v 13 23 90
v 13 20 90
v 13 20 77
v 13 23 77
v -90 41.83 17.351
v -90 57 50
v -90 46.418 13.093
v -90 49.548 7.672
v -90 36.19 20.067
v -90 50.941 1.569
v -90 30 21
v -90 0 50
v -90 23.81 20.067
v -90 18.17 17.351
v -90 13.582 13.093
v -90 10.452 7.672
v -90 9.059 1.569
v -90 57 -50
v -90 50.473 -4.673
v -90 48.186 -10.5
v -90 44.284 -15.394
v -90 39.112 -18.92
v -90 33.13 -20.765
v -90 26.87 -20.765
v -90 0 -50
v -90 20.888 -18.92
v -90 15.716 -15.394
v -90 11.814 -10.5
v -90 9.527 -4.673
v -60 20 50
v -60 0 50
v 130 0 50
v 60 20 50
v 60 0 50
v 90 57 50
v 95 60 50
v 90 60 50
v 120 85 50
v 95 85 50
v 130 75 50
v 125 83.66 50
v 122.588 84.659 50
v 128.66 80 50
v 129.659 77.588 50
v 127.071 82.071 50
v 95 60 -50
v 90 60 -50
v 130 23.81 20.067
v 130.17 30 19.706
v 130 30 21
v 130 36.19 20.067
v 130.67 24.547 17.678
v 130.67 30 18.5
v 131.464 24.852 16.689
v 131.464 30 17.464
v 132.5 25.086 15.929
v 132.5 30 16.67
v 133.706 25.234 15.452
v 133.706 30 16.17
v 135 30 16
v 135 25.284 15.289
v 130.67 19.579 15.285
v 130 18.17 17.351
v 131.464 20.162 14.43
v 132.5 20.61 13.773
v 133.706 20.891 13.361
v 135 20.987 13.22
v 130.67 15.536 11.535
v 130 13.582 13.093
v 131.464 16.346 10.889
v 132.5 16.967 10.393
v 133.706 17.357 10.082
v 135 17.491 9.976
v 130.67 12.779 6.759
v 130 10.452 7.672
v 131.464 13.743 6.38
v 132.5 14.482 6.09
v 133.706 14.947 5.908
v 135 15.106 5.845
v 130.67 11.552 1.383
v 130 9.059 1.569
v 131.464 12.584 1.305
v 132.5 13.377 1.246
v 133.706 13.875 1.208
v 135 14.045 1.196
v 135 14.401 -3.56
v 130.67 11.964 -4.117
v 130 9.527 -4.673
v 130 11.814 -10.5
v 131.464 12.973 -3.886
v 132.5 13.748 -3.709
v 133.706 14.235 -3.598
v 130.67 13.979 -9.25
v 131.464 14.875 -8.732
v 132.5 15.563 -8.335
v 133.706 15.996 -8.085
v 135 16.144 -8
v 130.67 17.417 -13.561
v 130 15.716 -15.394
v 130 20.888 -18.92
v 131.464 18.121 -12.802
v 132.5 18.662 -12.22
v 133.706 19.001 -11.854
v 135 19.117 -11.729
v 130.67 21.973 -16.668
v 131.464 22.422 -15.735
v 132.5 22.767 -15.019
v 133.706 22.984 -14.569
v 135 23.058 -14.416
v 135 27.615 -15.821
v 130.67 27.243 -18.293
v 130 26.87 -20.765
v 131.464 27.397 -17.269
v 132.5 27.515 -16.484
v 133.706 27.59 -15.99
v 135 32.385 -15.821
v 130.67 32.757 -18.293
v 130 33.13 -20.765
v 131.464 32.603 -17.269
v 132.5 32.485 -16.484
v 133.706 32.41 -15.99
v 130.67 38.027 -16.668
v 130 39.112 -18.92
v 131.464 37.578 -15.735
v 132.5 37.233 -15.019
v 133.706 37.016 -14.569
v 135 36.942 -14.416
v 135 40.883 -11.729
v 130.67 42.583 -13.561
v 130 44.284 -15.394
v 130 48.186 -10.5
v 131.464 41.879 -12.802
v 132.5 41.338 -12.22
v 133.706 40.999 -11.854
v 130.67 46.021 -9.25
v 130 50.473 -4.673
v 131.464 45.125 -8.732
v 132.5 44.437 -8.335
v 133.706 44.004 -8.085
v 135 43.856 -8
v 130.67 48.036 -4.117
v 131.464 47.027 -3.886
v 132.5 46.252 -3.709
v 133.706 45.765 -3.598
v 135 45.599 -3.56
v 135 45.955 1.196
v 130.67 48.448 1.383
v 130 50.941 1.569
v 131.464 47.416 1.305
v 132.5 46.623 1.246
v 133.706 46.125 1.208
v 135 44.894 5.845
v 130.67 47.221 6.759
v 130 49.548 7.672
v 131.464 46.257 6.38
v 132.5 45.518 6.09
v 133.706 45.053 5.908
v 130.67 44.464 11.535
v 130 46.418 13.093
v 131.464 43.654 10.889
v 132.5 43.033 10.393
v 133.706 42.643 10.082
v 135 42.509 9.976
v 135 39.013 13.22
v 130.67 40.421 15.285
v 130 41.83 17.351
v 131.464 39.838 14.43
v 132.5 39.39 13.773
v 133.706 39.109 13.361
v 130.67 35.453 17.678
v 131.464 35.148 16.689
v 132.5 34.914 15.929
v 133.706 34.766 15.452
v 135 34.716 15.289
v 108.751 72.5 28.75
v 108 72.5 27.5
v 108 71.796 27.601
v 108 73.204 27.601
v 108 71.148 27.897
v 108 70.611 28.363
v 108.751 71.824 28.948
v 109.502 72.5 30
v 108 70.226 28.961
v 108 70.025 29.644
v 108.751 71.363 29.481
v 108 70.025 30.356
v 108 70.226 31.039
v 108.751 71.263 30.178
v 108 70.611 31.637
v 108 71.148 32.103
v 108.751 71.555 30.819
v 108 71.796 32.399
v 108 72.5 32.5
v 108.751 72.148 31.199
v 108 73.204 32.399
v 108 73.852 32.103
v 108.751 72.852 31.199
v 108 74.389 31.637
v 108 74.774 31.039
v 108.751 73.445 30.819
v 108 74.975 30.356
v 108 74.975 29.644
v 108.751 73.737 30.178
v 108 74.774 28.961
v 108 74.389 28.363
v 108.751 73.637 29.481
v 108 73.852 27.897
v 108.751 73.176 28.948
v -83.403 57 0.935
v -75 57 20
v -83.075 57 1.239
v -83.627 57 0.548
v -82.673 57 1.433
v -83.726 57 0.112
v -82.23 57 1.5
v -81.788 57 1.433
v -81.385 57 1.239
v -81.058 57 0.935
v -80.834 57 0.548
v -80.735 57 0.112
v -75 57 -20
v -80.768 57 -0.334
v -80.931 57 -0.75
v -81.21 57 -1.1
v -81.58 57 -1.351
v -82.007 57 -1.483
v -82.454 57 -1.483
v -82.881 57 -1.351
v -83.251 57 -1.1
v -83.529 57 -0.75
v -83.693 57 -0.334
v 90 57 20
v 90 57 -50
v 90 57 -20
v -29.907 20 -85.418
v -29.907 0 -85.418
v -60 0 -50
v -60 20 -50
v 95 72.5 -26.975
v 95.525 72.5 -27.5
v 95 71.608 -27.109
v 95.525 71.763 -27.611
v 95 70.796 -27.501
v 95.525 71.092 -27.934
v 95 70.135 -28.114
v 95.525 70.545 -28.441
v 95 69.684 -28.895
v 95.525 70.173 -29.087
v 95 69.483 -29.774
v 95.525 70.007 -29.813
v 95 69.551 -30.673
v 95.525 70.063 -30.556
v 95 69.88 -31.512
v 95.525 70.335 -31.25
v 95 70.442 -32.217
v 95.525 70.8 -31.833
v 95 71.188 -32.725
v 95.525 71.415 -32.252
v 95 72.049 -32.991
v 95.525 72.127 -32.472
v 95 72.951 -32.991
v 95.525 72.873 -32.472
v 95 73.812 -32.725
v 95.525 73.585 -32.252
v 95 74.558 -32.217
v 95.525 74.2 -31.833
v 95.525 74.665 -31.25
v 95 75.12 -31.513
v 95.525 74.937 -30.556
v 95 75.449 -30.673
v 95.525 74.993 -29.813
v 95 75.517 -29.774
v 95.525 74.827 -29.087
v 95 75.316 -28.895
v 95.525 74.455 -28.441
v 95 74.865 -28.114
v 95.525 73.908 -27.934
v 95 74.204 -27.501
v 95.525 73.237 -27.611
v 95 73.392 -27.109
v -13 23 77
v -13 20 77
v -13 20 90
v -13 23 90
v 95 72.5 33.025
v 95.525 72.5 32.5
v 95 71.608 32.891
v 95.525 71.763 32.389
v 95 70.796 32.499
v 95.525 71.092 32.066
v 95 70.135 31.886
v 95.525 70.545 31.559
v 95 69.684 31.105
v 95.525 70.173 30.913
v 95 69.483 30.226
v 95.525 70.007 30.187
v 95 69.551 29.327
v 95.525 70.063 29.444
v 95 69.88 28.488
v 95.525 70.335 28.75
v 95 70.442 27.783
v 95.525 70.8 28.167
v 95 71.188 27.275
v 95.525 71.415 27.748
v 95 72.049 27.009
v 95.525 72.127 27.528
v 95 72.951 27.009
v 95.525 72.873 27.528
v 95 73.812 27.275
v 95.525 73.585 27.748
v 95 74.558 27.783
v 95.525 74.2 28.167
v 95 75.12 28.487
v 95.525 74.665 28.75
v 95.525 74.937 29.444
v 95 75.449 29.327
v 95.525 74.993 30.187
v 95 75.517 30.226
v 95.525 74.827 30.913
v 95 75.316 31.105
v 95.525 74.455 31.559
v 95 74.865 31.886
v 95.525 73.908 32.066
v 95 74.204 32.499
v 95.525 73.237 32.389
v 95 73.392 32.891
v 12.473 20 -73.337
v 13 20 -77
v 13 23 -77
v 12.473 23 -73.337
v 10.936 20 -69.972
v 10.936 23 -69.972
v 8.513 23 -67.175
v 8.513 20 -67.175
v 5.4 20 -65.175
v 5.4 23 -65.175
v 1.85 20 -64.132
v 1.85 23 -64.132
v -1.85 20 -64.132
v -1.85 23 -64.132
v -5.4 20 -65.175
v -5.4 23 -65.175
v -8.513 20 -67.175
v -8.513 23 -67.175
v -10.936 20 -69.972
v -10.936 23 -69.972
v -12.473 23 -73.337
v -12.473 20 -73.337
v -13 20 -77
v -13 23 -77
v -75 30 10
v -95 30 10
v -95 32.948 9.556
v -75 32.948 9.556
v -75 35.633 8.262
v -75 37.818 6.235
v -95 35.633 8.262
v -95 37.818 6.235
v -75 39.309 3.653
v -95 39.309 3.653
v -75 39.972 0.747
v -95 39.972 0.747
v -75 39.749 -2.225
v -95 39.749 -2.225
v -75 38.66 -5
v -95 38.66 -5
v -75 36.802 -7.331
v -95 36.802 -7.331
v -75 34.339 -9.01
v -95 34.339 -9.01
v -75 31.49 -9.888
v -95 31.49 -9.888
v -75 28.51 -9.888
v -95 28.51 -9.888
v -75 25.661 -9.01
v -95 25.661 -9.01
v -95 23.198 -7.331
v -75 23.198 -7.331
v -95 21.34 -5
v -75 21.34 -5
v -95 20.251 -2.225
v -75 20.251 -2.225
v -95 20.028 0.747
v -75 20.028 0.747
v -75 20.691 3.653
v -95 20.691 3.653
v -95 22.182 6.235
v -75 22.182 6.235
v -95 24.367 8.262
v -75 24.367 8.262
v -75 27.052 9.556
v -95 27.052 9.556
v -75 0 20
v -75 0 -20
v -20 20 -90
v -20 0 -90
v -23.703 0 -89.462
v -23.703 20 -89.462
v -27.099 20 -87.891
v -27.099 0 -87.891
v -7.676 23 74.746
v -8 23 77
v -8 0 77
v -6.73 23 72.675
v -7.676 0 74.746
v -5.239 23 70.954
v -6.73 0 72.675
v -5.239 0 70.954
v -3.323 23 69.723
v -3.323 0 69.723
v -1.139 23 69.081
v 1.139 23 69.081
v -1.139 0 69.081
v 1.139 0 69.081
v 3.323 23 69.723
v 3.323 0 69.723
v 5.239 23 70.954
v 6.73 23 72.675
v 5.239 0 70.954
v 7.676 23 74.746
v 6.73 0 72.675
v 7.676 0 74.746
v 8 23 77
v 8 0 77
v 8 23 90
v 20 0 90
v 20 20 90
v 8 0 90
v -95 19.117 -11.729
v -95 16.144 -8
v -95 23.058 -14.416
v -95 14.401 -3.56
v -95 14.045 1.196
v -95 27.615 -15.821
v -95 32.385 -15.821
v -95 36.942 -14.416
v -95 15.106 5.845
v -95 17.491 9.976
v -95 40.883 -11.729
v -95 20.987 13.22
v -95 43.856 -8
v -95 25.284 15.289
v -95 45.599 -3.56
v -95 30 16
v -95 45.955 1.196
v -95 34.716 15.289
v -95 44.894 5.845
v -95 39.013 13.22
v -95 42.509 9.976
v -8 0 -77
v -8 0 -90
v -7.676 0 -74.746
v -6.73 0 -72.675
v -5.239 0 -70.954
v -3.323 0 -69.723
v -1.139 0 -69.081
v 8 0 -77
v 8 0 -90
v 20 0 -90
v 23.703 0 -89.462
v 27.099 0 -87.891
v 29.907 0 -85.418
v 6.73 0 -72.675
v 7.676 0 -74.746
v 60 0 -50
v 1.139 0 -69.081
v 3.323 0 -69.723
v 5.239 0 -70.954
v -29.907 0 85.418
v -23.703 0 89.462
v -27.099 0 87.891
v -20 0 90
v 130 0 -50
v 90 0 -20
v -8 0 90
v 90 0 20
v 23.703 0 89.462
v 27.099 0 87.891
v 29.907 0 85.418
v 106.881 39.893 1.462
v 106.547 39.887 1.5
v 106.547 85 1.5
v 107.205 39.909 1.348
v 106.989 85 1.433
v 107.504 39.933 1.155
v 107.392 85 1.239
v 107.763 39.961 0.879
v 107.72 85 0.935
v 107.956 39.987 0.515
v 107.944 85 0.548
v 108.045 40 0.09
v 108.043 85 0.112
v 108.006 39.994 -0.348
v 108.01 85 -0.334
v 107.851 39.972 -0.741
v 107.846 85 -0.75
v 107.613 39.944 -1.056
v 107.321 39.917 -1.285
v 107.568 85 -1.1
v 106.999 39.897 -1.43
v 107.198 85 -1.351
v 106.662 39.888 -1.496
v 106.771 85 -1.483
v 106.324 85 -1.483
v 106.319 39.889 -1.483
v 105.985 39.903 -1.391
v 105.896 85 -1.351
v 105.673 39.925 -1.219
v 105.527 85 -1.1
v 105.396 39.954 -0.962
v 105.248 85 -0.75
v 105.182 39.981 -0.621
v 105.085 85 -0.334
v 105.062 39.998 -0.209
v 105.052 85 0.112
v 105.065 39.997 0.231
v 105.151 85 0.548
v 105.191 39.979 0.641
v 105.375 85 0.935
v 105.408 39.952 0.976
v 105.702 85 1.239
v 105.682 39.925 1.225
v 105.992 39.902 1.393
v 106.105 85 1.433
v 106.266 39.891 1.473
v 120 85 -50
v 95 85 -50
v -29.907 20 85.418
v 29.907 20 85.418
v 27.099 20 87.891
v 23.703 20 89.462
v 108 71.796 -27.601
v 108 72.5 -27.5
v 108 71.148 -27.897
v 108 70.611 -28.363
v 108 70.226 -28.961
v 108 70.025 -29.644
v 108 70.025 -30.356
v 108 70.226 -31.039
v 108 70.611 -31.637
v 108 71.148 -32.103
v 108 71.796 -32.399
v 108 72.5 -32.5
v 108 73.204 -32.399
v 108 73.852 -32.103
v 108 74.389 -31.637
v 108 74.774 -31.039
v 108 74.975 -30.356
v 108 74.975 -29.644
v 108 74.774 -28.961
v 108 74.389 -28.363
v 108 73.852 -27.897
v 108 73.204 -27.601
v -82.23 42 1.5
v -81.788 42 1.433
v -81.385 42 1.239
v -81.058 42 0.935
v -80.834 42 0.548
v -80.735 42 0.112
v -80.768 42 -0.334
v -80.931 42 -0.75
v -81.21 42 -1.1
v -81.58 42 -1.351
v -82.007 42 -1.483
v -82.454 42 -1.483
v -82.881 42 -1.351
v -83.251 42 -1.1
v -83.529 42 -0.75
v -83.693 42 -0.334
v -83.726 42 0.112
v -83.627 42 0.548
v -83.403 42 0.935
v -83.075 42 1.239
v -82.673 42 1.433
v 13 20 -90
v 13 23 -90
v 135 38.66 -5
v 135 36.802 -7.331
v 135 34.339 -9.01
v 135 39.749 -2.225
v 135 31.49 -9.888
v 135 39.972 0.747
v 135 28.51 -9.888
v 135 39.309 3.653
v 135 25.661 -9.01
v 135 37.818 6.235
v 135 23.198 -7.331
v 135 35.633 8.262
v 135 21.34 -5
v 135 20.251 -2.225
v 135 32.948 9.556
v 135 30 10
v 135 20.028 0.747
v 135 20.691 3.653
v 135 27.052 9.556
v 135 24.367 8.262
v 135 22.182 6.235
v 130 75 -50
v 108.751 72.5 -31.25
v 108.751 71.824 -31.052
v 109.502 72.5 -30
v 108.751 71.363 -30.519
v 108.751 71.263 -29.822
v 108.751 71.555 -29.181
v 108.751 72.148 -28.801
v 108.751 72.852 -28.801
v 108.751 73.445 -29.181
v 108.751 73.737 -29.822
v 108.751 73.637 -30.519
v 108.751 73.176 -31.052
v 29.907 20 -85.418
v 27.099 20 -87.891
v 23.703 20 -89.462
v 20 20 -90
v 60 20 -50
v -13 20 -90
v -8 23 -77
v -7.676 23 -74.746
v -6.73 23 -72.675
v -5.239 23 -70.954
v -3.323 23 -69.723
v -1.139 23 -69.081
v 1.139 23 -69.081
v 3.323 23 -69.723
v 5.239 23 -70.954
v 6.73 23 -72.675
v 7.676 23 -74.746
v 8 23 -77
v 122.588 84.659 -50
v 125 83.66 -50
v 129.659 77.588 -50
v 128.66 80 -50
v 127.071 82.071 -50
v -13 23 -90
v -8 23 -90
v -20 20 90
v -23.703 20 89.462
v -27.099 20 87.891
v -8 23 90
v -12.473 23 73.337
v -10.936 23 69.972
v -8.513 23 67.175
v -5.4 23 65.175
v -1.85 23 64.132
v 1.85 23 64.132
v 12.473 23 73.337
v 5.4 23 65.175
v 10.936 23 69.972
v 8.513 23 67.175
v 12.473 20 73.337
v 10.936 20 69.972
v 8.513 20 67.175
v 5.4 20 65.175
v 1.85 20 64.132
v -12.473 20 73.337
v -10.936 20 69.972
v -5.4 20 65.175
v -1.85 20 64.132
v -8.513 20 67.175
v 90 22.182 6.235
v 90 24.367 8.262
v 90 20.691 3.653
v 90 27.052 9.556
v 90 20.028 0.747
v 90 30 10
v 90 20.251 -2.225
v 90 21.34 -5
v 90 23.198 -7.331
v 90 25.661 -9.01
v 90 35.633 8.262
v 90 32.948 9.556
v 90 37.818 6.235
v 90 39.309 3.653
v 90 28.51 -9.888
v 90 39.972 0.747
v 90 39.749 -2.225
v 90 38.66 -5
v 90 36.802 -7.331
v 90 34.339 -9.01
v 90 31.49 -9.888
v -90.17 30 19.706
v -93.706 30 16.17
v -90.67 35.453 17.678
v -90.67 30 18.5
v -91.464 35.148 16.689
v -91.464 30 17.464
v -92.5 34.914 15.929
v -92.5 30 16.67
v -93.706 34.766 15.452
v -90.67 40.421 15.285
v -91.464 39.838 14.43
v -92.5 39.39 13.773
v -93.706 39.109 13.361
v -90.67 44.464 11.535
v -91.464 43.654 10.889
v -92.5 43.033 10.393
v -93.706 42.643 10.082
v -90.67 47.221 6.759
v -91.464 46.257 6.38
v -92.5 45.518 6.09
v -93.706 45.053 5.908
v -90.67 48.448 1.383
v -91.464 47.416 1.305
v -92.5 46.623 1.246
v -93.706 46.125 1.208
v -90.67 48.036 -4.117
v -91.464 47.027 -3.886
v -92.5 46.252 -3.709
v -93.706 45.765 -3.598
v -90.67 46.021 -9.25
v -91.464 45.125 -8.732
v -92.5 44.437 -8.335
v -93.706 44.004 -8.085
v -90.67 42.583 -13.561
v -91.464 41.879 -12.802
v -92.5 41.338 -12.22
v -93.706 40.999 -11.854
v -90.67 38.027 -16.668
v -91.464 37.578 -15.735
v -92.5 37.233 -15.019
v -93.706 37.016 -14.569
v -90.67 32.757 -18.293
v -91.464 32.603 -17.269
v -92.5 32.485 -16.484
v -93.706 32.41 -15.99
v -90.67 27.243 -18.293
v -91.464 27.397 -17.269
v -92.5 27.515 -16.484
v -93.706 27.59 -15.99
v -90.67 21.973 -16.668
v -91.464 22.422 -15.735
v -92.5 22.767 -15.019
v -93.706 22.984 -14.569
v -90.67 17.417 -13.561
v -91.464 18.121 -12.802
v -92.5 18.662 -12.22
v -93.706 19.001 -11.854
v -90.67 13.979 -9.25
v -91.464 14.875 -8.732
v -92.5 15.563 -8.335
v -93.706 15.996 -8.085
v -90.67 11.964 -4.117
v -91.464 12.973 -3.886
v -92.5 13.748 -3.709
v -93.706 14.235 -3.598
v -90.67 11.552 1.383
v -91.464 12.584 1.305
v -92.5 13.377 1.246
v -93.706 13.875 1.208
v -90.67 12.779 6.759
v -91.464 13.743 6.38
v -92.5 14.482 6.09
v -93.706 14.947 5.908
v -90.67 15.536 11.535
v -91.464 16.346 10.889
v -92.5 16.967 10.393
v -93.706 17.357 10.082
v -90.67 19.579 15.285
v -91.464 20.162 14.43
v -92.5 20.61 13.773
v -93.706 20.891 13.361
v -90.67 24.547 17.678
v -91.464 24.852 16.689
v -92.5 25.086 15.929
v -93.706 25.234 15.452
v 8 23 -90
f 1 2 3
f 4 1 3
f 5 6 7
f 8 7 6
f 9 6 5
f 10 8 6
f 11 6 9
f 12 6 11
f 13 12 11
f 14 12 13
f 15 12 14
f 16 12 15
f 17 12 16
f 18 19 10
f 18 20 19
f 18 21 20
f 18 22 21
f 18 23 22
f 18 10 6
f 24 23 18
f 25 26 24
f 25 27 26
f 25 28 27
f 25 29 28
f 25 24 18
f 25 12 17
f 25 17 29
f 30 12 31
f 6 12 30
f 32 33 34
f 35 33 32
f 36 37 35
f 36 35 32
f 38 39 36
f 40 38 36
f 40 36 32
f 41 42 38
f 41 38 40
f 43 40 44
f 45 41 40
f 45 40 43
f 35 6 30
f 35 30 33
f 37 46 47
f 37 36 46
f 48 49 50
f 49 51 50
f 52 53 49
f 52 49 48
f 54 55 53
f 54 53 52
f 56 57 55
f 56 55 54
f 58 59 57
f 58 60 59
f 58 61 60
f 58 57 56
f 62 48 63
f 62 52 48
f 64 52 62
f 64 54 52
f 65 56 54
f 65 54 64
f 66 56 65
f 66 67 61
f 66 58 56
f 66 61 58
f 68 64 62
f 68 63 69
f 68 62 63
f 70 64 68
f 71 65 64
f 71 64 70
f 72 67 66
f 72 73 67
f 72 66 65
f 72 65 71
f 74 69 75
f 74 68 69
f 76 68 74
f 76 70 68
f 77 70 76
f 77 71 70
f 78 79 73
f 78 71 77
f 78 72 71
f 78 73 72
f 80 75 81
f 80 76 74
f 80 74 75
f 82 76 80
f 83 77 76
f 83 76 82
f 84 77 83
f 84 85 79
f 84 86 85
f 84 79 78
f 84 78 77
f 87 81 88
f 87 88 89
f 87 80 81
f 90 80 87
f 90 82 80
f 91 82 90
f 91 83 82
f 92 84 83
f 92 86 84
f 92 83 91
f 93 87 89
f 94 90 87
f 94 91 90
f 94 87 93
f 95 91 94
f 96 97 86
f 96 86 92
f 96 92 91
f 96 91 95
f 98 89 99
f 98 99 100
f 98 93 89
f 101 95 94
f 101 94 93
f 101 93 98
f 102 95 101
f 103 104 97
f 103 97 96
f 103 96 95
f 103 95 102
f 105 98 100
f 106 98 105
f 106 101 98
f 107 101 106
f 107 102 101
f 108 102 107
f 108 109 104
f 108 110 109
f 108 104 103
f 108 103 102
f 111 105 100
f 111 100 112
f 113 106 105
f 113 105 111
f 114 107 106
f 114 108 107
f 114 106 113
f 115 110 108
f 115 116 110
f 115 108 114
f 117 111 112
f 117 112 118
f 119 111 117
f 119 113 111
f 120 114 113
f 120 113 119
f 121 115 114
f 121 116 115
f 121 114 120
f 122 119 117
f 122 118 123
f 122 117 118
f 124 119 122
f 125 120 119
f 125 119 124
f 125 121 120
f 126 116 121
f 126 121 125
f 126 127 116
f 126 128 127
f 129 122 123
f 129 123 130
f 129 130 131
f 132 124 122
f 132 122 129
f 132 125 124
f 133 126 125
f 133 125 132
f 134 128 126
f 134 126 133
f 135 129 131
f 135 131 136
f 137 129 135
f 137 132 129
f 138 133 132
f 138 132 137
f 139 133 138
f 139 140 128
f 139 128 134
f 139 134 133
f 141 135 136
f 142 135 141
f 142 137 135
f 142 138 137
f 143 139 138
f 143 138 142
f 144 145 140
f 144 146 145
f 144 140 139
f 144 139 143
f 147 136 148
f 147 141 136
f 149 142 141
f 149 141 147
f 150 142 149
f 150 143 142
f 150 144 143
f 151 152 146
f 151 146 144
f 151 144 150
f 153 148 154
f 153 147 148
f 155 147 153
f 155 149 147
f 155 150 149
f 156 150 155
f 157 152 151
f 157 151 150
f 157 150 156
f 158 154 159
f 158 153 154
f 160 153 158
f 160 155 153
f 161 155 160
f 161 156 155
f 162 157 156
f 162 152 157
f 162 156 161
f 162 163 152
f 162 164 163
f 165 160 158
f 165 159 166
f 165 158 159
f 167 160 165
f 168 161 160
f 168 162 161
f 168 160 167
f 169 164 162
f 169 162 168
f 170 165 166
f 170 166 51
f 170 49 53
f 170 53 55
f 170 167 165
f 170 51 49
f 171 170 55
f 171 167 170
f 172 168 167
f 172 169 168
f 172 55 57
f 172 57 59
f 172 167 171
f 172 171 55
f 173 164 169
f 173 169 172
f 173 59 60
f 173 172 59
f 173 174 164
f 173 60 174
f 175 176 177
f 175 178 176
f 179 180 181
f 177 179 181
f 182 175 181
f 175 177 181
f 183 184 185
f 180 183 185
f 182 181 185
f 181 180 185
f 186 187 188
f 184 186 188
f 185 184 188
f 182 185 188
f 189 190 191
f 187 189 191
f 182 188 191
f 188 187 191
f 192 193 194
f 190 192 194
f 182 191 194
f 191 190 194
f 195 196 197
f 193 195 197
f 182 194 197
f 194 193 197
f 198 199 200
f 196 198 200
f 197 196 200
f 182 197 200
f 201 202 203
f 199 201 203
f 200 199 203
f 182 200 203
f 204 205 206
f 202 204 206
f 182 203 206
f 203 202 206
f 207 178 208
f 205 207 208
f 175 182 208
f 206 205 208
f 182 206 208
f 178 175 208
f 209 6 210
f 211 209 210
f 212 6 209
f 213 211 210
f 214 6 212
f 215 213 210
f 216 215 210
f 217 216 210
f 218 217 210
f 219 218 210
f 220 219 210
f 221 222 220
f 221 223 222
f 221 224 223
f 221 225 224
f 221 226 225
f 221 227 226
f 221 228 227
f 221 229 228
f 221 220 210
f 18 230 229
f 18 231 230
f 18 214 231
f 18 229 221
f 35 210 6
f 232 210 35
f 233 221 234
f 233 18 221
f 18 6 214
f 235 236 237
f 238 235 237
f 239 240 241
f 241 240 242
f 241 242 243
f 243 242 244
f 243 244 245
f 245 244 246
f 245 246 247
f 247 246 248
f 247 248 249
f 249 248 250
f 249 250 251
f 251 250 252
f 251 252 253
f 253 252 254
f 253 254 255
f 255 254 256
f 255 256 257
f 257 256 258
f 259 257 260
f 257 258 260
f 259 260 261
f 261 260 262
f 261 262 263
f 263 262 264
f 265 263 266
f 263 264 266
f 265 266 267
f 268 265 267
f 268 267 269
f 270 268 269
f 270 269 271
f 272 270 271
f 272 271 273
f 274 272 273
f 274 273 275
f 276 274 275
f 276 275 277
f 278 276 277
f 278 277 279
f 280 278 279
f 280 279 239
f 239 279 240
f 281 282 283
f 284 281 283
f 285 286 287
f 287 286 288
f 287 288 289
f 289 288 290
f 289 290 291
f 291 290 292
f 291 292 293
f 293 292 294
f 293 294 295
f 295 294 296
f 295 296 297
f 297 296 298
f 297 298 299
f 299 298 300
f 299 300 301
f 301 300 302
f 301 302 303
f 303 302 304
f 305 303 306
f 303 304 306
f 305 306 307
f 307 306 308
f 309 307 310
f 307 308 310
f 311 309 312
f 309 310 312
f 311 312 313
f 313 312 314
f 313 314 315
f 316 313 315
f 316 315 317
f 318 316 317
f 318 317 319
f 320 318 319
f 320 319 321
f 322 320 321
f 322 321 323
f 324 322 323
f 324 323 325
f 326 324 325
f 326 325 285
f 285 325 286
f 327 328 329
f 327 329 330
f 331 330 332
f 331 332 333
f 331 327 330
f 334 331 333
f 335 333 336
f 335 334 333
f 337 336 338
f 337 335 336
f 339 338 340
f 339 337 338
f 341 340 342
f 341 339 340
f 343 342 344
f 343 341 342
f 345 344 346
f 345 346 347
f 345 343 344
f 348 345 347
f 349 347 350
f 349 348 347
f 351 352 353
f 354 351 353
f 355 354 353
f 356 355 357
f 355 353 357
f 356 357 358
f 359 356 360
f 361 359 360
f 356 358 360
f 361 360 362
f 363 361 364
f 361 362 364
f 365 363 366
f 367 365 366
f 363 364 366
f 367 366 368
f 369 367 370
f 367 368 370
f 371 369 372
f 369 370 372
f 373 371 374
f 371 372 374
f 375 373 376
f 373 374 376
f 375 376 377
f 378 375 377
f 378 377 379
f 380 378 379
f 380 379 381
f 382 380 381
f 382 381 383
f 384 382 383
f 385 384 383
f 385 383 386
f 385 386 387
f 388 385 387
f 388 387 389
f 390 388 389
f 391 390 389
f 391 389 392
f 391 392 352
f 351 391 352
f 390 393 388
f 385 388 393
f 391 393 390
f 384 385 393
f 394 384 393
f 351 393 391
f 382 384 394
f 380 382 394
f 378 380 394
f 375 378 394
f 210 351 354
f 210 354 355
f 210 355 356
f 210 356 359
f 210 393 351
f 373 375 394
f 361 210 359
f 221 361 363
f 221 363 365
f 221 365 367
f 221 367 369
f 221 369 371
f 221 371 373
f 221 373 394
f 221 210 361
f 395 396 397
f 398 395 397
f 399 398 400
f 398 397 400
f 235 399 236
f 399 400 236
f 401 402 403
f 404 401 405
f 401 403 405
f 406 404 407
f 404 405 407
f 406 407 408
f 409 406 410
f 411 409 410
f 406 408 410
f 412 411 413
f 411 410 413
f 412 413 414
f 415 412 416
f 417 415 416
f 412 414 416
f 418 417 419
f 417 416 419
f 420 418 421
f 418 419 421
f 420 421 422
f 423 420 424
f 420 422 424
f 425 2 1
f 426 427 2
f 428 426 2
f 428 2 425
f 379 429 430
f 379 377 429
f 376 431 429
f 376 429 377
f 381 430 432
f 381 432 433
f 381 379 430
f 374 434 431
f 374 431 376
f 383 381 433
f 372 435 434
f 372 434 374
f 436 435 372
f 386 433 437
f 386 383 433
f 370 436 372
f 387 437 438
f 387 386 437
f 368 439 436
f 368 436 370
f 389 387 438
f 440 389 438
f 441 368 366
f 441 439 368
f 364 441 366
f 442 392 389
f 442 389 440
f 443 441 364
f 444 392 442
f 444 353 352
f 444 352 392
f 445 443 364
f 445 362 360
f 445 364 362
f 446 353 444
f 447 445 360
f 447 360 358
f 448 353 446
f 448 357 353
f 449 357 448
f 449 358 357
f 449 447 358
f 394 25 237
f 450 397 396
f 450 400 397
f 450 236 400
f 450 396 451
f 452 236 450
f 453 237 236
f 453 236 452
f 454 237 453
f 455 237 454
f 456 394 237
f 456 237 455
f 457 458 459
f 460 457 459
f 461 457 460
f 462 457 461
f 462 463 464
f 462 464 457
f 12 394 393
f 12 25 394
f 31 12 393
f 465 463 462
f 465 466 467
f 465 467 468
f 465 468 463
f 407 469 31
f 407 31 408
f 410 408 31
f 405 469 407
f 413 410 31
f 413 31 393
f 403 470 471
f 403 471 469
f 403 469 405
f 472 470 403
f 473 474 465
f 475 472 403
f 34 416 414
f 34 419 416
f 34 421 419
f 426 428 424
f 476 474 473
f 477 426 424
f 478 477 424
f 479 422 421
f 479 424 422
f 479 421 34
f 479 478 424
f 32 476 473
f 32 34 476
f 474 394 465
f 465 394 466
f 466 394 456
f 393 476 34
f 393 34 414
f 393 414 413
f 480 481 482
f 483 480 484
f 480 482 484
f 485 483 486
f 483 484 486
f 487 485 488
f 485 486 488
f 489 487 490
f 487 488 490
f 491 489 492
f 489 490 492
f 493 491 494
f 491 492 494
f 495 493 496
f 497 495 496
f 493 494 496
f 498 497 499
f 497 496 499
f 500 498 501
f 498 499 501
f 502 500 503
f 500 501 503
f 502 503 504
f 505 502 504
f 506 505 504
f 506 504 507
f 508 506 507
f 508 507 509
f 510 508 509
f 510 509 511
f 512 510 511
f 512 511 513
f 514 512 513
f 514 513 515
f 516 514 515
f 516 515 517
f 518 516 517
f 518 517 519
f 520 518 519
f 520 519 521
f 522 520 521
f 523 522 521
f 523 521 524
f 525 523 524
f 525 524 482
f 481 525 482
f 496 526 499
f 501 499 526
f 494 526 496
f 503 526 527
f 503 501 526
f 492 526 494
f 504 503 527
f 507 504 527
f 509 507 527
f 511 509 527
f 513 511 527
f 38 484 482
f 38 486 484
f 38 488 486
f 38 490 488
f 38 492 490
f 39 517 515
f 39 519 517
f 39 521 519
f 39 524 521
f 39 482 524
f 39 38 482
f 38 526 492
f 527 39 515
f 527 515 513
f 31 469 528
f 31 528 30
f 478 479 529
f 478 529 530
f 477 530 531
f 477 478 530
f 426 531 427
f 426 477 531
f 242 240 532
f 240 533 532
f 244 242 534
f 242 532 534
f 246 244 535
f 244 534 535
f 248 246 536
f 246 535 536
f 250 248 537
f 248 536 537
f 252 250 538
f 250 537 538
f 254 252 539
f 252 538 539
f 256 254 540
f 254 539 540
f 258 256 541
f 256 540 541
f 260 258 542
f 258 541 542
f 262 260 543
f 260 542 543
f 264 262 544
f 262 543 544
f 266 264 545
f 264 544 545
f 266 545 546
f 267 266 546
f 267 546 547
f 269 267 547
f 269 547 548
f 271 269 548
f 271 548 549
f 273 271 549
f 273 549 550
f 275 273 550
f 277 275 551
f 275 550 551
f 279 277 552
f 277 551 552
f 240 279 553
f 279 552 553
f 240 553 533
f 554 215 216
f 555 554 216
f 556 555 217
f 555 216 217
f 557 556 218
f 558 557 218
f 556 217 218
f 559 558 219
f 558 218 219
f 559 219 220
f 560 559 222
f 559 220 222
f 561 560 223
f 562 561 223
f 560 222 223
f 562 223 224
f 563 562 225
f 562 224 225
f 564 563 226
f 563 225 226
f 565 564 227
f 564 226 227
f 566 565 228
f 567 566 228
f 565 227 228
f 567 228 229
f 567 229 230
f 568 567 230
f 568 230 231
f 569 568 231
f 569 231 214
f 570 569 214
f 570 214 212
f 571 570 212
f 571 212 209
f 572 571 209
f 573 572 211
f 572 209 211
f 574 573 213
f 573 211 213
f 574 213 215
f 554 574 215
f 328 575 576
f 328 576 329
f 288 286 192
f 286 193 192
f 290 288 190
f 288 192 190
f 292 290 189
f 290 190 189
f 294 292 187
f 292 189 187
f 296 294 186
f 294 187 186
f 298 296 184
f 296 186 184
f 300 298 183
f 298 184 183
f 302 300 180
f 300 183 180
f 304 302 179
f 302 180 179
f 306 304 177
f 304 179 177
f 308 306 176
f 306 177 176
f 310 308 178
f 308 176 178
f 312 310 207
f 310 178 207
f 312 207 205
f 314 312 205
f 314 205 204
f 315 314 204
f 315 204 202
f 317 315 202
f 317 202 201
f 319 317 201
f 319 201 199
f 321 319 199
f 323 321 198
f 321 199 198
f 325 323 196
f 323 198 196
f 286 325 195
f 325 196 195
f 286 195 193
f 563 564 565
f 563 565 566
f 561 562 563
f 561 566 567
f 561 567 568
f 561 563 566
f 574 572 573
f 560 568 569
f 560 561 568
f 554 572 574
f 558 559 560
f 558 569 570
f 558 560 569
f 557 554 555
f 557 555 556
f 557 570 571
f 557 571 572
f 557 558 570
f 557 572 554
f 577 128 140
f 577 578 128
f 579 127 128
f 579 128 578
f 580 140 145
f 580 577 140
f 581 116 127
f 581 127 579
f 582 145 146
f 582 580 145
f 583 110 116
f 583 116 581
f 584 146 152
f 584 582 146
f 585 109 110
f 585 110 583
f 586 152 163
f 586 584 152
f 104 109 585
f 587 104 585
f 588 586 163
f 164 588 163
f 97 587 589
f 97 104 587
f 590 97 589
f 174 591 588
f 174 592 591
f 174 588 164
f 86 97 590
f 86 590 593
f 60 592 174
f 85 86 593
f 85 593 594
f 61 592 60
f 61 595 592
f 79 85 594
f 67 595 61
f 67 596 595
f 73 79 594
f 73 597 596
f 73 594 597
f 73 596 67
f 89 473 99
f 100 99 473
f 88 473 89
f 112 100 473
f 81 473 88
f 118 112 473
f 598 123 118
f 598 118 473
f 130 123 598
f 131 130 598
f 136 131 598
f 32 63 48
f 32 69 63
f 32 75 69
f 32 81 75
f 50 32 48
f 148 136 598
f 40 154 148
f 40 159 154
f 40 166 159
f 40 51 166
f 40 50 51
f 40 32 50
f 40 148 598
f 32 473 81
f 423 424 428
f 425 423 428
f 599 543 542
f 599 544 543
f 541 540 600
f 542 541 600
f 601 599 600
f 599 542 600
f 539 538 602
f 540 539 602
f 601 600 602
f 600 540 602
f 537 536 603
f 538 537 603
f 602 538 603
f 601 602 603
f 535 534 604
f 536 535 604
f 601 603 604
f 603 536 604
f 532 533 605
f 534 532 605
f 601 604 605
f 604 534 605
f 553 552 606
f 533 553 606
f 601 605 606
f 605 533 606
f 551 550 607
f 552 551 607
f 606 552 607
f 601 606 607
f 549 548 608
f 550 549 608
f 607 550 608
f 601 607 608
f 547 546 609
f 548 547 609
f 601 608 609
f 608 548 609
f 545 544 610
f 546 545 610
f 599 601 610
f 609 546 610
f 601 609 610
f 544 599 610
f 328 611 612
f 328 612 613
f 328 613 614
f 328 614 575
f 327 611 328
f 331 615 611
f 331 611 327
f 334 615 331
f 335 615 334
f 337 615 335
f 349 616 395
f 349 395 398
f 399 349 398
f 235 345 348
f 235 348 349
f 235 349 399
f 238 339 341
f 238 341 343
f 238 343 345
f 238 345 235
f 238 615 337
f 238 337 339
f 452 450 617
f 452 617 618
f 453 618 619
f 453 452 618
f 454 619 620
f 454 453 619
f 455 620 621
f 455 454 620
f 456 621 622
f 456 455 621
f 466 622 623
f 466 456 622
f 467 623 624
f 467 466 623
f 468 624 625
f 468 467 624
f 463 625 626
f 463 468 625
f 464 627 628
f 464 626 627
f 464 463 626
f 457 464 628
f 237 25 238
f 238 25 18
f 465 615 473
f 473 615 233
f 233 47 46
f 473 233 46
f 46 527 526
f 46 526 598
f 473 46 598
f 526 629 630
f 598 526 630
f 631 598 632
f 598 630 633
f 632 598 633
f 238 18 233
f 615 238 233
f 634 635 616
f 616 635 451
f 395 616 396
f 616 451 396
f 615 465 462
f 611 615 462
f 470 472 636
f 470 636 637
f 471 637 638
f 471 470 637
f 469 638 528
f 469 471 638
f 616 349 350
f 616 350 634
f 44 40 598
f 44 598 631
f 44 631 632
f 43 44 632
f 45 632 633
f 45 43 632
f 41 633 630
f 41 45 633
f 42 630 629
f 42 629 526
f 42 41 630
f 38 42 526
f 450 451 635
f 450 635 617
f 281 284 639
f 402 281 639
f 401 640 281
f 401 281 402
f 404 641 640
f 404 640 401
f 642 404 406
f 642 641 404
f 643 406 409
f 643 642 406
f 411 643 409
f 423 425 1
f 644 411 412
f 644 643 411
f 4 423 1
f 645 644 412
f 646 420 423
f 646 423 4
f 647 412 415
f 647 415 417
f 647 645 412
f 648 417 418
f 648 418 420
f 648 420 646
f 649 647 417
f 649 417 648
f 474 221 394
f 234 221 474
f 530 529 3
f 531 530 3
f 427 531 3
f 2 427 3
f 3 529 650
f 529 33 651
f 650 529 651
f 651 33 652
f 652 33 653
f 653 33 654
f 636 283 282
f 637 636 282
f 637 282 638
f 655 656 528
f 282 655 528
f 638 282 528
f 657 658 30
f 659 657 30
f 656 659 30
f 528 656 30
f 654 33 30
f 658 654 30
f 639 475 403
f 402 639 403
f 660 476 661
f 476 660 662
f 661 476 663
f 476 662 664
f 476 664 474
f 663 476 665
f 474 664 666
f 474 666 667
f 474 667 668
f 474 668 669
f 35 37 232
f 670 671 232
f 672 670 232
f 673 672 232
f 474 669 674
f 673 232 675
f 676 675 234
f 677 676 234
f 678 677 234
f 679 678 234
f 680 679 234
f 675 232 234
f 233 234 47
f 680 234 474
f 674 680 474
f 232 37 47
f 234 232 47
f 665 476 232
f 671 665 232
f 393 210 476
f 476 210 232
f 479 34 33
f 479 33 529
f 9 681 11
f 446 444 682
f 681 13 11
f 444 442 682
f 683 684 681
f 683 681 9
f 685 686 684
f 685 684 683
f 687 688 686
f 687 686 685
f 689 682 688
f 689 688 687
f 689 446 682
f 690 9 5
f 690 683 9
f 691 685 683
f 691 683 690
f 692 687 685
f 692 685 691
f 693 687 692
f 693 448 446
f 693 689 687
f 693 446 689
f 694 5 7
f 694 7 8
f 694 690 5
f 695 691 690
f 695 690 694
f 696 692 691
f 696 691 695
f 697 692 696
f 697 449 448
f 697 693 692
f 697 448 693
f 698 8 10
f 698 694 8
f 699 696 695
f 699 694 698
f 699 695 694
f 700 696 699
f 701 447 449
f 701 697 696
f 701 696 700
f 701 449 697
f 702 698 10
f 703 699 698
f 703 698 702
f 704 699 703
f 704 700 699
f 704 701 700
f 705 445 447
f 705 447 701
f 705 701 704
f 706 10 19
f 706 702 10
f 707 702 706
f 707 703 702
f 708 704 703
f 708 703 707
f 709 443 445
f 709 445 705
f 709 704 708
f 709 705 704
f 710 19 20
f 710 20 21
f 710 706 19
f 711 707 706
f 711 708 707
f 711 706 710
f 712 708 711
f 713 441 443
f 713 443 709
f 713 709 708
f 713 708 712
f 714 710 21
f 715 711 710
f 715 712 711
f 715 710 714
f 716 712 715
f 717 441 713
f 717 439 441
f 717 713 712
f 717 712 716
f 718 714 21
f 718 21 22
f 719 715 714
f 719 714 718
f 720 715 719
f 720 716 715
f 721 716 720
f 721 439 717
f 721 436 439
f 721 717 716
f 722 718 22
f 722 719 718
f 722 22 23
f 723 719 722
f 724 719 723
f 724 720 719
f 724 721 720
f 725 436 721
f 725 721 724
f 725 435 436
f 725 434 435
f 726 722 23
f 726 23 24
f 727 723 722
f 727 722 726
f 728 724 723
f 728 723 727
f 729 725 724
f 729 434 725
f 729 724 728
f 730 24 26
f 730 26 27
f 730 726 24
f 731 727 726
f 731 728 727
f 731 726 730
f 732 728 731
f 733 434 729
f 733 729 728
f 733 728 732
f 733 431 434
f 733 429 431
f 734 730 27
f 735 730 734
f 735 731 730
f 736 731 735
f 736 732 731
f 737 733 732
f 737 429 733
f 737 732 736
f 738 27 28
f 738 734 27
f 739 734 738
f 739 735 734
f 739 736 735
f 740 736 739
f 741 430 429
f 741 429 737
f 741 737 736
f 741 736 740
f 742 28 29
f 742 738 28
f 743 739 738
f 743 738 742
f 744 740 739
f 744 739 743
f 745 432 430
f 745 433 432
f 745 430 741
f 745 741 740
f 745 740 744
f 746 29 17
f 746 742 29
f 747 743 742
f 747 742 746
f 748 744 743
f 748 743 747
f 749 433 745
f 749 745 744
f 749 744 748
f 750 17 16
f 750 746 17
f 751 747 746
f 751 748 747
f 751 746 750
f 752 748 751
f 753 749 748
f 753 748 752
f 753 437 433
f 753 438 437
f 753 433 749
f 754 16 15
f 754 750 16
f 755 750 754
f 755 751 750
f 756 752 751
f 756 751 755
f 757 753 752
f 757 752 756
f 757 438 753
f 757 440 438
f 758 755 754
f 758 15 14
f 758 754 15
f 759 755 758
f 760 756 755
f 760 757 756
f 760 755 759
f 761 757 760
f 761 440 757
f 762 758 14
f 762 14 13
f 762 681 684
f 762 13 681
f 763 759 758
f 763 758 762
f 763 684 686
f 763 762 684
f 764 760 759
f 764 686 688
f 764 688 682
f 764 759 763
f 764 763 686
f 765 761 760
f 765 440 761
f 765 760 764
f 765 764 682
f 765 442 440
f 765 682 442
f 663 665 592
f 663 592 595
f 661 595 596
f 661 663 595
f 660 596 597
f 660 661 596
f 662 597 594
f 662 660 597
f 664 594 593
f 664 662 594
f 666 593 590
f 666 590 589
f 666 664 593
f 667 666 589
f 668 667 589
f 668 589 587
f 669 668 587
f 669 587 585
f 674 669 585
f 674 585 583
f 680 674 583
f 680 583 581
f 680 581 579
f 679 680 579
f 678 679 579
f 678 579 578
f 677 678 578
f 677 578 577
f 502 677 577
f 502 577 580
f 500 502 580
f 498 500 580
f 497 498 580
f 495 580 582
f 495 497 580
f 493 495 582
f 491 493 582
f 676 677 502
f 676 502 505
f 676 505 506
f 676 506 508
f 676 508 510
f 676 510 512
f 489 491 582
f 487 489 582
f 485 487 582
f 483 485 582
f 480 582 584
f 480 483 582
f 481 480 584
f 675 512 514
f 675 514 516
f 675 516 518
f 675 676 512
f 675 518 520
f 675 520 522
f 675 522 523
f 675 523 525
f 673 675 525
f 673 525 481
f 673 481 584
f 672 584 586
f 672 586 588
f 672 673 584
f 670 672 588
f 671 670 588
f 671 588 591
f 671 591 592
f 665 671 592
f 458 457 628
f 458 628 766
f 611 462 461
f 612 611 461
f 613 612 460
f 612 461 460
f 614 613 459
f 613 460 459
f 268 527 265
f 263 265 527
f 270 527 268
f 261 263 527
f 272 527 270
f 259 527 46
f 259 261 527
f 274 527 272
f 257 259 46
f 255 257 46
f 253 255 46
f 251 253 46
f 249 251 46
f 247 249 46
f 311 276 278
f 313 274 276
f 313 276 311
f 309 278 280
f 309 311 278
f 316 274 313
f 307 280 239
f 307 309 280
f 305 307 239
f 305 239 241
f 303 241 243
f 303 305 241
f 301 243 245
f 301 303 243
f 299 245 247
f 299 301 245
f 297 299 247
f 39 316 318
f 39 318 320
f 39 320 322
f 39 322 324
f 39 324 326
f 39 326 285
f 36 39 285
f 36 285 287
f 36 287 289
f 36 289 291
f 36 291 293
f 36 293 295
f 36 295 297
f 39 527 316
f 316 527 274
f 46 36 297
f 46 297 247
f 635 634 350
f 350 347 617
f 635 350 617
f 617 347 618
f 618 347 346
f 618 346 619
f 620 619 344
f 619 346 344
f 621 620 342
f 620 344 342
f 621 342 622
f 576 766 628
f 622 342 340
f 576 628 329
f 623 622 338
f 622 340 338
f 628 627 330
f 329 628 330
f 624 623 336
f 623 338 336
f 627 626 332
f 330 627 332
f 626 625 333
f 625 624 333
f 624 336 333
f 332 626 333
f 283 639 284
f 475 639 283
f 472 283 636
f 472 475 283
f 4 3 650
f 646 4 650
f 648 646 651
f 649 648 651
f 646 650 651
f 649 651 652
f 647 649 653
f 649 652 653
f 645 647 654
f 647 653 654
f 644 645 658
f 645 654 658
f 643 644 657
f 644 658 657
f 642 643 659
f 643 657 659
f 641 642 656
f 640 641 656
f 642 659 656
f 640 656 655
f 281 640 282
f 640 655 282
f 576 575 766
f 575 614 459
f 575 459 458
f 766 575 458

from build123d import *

# Parameters (mm, degrees)
SKETCH1_W                   = 180
SKETCH1_H                   = 100
BOSS_EXTRUDE1_DEPTH         = 57
BOSS_EXTRUDE2_DEPTH         = 20
BOSS_EXTRUDE3_DEPTH         = 3
CUT_EXTRUDE2_DEPTH          = 132.742172443
CUT_EXTRUDE2_DEPTH_BACK     = 23
CUT_EXTRUDE3_DEPTH          = 132.742172443
CUT_EXTRUDE3_DEPTH_BACK     = 23
BOSS_EXTRUDE4_DEPTH         = 50
SKETCH8_R                   = 16
BOSS_EXTRUDE5_DEPTH         = 5
BOSS_EXTRUDE6_START         = 5
SKETCH11_R                  = 16
BOSS_EXTRUDE6_DEPTH         = 5
SKETCH13_W                  = 165
SKETCH13_H                  = 40
CUT_EXTRUDE6_DEPTH          = 172.970927776
M6_TAPPED_HOLE1_D           = 5
M6_TAPPED_HOLE1_DEPTH       = 13
M6_TAPPED_HOLE1_CSINK_D     = 6.05
M6_TAPPED_HOLE1_CSINK_ANGLE = 90
M6_TAPPED_HOLE1_TIP         = 1.502151548
FILLET4_R                   = 5
SKETCH17_R                  = 10
CUT_EXTRUDE7_DEPTH          = 40
FILLET5_R                   = 5
CUT_EXTRUDE8_START          = -115
SKETCH18_R                  = 10
CUT_EXTRUDE8_DEPTH          = 115
SKETCH19_R                  = 1.5
CUT_EXTRUDE9_DEPTH          = 15
SKETCH20_R                  = 1.5
CUT_EXTRUDE10_DEPTH         = 46


with BuildPart() as part:
    # Sketch1 → Boss-Extrude1 (new body)
    with BuildSketch(Plane(origin=(0, 0, 0), x_dir=(1, 0, 0), z_dir=(0, 1, 0))):
        Rectangle(SKETCH1_W, SKETCH1_H)
    extrude(amount=BOSS_EXTRUDE1_DEPTH)

    # Sketch2 → Boss-Extrude2 (add)
    with BuildSketch(Plane(origin=(0, 0, 0), x_dir=(1, 0, 0), z_dir=(0, 1, 0))):
        with BuildLine():
            Line((-60, -50), (60, -50))
            Line((60, -50), (29.906829478, -85.417525153))
            ThreePointArc((29.906829478, -85.417525153), (25.4576631, -88.798894588), (20, -90))
            Line((20, -90), (8, -90))
            Line((8, -90), (-8, -90))
            Line((-8, -90), (-20, -90))
            ThreePointArc((-20, -90), (-25.4576631, -88.798894588), (-29.906829478, -85.417525153))
            Line((-29.906829478, -85.417525153), (-60, -50))
        make_face()
    boss_extrude2 = extrude(amount=BOSS_EXTRUDE2_DEPTH)

    # Sketch3 → Boss-Extrude3 (add)
    with BuildSketch(Plane(origin=(0, 20, 0), x_dir=(1, 0, 0), z_dir=(0, 1, 0))):
        with BuildLine():
            Line((-13, -77), (-13, -90))
            Line((-13, -90), (13, -90))
            Line((13, -90), (13, -77))
            ThreePointArc((13, -77), (0, -64), (-13, -77))
        make_face()
    boss_extrude3 = extrude(amount=BOSS_EXTRUDE3_DEPTH)

    # Sketch4 → Cut-Extrude2 (cut, two sides: drawn at the far end of the back side and taken through both)
    with BuildSketch(Plane(origin=(0, 23, 0), x_dir=(1, 0, 0), z_dir=(0, 1, 0)).offset(-CUT_EXTRUDE2_DEPTH_BACK)):
        with BuildLine():
            Line((-8, -441.783557241), (-8, -90))
            Line((-8, -90), (-8, -77))
            ThreePointArc((-8, -77), (0, -69), (8, -77))
            Line((8, -77), (8, -90))
            Line((8, -90), (8, -441.783557241))
            Line((8, -441.783557241), (8, -1145.350671722))
            Line((8, -1145.350671722), (-8, -1145.350671722))
            Line((-8, -1145.350671722), (-8, -441.783557241))
        make_face()
    extrude(amount=CUT_EXTRUDE2_DEPTH + CUT_EXTRUDE2_DEPTH_BACK, mode=Mode.SUBTRACT)

    # Mirror5: Boss-Extrude2 across plane
    add(boss_extrude2.mirror(Plane.XY))

    # Mirror6: Boss-Extrude3 across plane
    add(boss_extrude3.mirror(Plane.XY))

    # Sketch5 → Cut-Extrude3 (cut, two sides: drawn at the far end of the back side and taken through both)
    with BuildSketch(Plane(origin=(0, 23, 0), x_dir=(1, 0, 0), z_dir=(0, 1, 0)).offset(-CUT_EXTRUDE3_DEPTH_BACK)):
        with BuildLine():
            Line((-8, 90), (-8, 77))
            ThreePointArc((-8, 77), (0, 69), (8, 77))
            Line((8, 77), (8, 90))
            Line((8, 90), (-8, 90))
        make_face()
    extrude(amount=CUT_EXTRUDE3_DEPTH + CUT_EXTRUDE3_DEPTH_BACK, mode=Mode.SUBTRACT)

    # Sketch6 → Boss-Extrude4 (add, symmetric)
    with BuildSketch(Plane.XY):
        with BuildLine():
            Line((90, 0), (130, 0))
            Line((130, 0), (130, 75))
            ThreePointArc((130, 75), (127.071067812, 82.071067812), (120, 85))
            Line((120, 85), (95, 85))
            Line((95, 85), (95, 60))
            Line((95, 60), (90, 60))
            Line((90, 60), (90, 57))
            Line((90, 57), (90, 0))
        make_face()
    extrude(amount=BOSS_EXTRUDE4_DEPTH, both=True)

    # Sketch8 → Boss-Extrude5 (add)
    with BuildSketch(Plane(origin=(130, 0, 0), x_dir=(0, 0, -1), z_dir=(1, 0, 0))):
        with Locations(Location((0, 30, 0), (0, 0, 180))):
            Circle(SKETCH8_R)
    extrude(amount=BOSS_EXTRUDE5_DEPTH)

    # Sketch11 → Boss-Extrude6 (add)
    with BuildSketch(Plane.ZY.offset(90).offset(BOSS_EXTRUDE6_START)):
        with Locations((0, 30)):
            Circle(SKETCH11_R)
    extrude(amount=-BOSS_EXTRUDE6_DEPTH)

    # Sketch13 → Cut-Extrude6 (cut, through all)
    with BuildSketch(Plane(origin=(0, 57, 0), x_dir=(1, 0, 0), z_dir=(0, 1, 0))):
        with Locations((7.5, 0)):
            Rectangle(SKETCH13_W, SKETCH13_H)
    extrude(amount=-CUT_EXTRUDE6_DEPTH, mode=Mode.SUBTRACT)

    # M6 Tapped Hole1
    with Locations(Plane(origin=(95, 72.5, -30), x_dir=(0, 0, -1), z_dir=(-1, 0, 0))):
        with Locations((0, 0), (-60, 0)):
            CounterSinkHole(M6_TAPPED_HOLE1_D / 2, M6_TAPPED_HOLE1_CSINK_D / 2, depth=M6_TAPPED_HOLE1_DEPTH, counter_sink_angle=M6_TAPPED_HOLE1_CSINK_ANGLE)
            with Locations((0, 0, -(M6_TAPPED_HOLE1_DEPTH + M6_TAPPED_HOLE1_TIP / 2))):  # 118° drill point
                Cone(0, M6_TAPPED_HOLE1_D / 2, M6_TAPPED_HOLE1_TIP, mode=Mode.SUBTRACT)

    # Fillet4
    fillet4_edges = [part.edges().sort_by_distance(p)[0] for p in [
        (-90, 30, -16),
    ]]
    fillet(fillet4_edges, radius=FILLET4_R - 0.0001)  # a hair under: the kernel refuses the full size

    # Sketch17 → Cut-Extrude7 (cut)
    with BuildSketch(Plane.ZY.offset(95)):
        with Locations((0, 30)):
            Circle(SKETCH17_R)
    extrude(amount=-CUT_EXTRUDE7_DEPTH, mode=Mode.SUBTRACT)

    # Fillet5
    fillet5_edges = [part.edges().sort_by_distance(p)[0] for p in [
        (130, 30, -16),
    ]]
    fillet(fillet5_edges, radius=FILLET5_R - 0.0001)  # a hair under: the kernel refuses the full size

    # Sketch18 → Cut-Extrude8 (cut)
    with BuildSketch(Plane(origin=(135, 0, 0), x_dir=(0, 0, -1), z_dir=(1, 0, 0)).offset(CUT_EXTRUDE8_START)):
        with Locations(Location((0, 30, 0), (0, 0, 180))):
            Circle(SKETCH18_R)
    extrude(amount=CUT_EXTRUDE8_DEPTH, mode=Mode.SUBTRACT)

    # Sketch19 → Cut-Extrude9 (cut)
    with BuildSketch(Plane(origin=(0, 57, 0), x_dir=(1, 0, 0), z_dir=(0, 1, 0))):
        with Locations(Location((-82.230390489, 0, 0), (0, 0, 270))):
            Circle(SKETCH19_R)
    extrude(amount=-CUT_EXTRUDE9_DEPTH, mode=Mode.SUBTRACT)

    # Sketch20 → Cut-Extrude10 (cut)
    with BuildSketch(Plane(origin=(0, 85, 0), x_dir=(1, 0, 0), z_dir=(0, 1, 0))):
        with Locations(Location((106.54731922, 0, 0), (0, 0, 270))):
            Circle(SKETCH20_R)
    extrude(amount=-CUT_EXTRUDE10_DEPTH, mode=Mode.SUBTRACT)


solid = part.part
